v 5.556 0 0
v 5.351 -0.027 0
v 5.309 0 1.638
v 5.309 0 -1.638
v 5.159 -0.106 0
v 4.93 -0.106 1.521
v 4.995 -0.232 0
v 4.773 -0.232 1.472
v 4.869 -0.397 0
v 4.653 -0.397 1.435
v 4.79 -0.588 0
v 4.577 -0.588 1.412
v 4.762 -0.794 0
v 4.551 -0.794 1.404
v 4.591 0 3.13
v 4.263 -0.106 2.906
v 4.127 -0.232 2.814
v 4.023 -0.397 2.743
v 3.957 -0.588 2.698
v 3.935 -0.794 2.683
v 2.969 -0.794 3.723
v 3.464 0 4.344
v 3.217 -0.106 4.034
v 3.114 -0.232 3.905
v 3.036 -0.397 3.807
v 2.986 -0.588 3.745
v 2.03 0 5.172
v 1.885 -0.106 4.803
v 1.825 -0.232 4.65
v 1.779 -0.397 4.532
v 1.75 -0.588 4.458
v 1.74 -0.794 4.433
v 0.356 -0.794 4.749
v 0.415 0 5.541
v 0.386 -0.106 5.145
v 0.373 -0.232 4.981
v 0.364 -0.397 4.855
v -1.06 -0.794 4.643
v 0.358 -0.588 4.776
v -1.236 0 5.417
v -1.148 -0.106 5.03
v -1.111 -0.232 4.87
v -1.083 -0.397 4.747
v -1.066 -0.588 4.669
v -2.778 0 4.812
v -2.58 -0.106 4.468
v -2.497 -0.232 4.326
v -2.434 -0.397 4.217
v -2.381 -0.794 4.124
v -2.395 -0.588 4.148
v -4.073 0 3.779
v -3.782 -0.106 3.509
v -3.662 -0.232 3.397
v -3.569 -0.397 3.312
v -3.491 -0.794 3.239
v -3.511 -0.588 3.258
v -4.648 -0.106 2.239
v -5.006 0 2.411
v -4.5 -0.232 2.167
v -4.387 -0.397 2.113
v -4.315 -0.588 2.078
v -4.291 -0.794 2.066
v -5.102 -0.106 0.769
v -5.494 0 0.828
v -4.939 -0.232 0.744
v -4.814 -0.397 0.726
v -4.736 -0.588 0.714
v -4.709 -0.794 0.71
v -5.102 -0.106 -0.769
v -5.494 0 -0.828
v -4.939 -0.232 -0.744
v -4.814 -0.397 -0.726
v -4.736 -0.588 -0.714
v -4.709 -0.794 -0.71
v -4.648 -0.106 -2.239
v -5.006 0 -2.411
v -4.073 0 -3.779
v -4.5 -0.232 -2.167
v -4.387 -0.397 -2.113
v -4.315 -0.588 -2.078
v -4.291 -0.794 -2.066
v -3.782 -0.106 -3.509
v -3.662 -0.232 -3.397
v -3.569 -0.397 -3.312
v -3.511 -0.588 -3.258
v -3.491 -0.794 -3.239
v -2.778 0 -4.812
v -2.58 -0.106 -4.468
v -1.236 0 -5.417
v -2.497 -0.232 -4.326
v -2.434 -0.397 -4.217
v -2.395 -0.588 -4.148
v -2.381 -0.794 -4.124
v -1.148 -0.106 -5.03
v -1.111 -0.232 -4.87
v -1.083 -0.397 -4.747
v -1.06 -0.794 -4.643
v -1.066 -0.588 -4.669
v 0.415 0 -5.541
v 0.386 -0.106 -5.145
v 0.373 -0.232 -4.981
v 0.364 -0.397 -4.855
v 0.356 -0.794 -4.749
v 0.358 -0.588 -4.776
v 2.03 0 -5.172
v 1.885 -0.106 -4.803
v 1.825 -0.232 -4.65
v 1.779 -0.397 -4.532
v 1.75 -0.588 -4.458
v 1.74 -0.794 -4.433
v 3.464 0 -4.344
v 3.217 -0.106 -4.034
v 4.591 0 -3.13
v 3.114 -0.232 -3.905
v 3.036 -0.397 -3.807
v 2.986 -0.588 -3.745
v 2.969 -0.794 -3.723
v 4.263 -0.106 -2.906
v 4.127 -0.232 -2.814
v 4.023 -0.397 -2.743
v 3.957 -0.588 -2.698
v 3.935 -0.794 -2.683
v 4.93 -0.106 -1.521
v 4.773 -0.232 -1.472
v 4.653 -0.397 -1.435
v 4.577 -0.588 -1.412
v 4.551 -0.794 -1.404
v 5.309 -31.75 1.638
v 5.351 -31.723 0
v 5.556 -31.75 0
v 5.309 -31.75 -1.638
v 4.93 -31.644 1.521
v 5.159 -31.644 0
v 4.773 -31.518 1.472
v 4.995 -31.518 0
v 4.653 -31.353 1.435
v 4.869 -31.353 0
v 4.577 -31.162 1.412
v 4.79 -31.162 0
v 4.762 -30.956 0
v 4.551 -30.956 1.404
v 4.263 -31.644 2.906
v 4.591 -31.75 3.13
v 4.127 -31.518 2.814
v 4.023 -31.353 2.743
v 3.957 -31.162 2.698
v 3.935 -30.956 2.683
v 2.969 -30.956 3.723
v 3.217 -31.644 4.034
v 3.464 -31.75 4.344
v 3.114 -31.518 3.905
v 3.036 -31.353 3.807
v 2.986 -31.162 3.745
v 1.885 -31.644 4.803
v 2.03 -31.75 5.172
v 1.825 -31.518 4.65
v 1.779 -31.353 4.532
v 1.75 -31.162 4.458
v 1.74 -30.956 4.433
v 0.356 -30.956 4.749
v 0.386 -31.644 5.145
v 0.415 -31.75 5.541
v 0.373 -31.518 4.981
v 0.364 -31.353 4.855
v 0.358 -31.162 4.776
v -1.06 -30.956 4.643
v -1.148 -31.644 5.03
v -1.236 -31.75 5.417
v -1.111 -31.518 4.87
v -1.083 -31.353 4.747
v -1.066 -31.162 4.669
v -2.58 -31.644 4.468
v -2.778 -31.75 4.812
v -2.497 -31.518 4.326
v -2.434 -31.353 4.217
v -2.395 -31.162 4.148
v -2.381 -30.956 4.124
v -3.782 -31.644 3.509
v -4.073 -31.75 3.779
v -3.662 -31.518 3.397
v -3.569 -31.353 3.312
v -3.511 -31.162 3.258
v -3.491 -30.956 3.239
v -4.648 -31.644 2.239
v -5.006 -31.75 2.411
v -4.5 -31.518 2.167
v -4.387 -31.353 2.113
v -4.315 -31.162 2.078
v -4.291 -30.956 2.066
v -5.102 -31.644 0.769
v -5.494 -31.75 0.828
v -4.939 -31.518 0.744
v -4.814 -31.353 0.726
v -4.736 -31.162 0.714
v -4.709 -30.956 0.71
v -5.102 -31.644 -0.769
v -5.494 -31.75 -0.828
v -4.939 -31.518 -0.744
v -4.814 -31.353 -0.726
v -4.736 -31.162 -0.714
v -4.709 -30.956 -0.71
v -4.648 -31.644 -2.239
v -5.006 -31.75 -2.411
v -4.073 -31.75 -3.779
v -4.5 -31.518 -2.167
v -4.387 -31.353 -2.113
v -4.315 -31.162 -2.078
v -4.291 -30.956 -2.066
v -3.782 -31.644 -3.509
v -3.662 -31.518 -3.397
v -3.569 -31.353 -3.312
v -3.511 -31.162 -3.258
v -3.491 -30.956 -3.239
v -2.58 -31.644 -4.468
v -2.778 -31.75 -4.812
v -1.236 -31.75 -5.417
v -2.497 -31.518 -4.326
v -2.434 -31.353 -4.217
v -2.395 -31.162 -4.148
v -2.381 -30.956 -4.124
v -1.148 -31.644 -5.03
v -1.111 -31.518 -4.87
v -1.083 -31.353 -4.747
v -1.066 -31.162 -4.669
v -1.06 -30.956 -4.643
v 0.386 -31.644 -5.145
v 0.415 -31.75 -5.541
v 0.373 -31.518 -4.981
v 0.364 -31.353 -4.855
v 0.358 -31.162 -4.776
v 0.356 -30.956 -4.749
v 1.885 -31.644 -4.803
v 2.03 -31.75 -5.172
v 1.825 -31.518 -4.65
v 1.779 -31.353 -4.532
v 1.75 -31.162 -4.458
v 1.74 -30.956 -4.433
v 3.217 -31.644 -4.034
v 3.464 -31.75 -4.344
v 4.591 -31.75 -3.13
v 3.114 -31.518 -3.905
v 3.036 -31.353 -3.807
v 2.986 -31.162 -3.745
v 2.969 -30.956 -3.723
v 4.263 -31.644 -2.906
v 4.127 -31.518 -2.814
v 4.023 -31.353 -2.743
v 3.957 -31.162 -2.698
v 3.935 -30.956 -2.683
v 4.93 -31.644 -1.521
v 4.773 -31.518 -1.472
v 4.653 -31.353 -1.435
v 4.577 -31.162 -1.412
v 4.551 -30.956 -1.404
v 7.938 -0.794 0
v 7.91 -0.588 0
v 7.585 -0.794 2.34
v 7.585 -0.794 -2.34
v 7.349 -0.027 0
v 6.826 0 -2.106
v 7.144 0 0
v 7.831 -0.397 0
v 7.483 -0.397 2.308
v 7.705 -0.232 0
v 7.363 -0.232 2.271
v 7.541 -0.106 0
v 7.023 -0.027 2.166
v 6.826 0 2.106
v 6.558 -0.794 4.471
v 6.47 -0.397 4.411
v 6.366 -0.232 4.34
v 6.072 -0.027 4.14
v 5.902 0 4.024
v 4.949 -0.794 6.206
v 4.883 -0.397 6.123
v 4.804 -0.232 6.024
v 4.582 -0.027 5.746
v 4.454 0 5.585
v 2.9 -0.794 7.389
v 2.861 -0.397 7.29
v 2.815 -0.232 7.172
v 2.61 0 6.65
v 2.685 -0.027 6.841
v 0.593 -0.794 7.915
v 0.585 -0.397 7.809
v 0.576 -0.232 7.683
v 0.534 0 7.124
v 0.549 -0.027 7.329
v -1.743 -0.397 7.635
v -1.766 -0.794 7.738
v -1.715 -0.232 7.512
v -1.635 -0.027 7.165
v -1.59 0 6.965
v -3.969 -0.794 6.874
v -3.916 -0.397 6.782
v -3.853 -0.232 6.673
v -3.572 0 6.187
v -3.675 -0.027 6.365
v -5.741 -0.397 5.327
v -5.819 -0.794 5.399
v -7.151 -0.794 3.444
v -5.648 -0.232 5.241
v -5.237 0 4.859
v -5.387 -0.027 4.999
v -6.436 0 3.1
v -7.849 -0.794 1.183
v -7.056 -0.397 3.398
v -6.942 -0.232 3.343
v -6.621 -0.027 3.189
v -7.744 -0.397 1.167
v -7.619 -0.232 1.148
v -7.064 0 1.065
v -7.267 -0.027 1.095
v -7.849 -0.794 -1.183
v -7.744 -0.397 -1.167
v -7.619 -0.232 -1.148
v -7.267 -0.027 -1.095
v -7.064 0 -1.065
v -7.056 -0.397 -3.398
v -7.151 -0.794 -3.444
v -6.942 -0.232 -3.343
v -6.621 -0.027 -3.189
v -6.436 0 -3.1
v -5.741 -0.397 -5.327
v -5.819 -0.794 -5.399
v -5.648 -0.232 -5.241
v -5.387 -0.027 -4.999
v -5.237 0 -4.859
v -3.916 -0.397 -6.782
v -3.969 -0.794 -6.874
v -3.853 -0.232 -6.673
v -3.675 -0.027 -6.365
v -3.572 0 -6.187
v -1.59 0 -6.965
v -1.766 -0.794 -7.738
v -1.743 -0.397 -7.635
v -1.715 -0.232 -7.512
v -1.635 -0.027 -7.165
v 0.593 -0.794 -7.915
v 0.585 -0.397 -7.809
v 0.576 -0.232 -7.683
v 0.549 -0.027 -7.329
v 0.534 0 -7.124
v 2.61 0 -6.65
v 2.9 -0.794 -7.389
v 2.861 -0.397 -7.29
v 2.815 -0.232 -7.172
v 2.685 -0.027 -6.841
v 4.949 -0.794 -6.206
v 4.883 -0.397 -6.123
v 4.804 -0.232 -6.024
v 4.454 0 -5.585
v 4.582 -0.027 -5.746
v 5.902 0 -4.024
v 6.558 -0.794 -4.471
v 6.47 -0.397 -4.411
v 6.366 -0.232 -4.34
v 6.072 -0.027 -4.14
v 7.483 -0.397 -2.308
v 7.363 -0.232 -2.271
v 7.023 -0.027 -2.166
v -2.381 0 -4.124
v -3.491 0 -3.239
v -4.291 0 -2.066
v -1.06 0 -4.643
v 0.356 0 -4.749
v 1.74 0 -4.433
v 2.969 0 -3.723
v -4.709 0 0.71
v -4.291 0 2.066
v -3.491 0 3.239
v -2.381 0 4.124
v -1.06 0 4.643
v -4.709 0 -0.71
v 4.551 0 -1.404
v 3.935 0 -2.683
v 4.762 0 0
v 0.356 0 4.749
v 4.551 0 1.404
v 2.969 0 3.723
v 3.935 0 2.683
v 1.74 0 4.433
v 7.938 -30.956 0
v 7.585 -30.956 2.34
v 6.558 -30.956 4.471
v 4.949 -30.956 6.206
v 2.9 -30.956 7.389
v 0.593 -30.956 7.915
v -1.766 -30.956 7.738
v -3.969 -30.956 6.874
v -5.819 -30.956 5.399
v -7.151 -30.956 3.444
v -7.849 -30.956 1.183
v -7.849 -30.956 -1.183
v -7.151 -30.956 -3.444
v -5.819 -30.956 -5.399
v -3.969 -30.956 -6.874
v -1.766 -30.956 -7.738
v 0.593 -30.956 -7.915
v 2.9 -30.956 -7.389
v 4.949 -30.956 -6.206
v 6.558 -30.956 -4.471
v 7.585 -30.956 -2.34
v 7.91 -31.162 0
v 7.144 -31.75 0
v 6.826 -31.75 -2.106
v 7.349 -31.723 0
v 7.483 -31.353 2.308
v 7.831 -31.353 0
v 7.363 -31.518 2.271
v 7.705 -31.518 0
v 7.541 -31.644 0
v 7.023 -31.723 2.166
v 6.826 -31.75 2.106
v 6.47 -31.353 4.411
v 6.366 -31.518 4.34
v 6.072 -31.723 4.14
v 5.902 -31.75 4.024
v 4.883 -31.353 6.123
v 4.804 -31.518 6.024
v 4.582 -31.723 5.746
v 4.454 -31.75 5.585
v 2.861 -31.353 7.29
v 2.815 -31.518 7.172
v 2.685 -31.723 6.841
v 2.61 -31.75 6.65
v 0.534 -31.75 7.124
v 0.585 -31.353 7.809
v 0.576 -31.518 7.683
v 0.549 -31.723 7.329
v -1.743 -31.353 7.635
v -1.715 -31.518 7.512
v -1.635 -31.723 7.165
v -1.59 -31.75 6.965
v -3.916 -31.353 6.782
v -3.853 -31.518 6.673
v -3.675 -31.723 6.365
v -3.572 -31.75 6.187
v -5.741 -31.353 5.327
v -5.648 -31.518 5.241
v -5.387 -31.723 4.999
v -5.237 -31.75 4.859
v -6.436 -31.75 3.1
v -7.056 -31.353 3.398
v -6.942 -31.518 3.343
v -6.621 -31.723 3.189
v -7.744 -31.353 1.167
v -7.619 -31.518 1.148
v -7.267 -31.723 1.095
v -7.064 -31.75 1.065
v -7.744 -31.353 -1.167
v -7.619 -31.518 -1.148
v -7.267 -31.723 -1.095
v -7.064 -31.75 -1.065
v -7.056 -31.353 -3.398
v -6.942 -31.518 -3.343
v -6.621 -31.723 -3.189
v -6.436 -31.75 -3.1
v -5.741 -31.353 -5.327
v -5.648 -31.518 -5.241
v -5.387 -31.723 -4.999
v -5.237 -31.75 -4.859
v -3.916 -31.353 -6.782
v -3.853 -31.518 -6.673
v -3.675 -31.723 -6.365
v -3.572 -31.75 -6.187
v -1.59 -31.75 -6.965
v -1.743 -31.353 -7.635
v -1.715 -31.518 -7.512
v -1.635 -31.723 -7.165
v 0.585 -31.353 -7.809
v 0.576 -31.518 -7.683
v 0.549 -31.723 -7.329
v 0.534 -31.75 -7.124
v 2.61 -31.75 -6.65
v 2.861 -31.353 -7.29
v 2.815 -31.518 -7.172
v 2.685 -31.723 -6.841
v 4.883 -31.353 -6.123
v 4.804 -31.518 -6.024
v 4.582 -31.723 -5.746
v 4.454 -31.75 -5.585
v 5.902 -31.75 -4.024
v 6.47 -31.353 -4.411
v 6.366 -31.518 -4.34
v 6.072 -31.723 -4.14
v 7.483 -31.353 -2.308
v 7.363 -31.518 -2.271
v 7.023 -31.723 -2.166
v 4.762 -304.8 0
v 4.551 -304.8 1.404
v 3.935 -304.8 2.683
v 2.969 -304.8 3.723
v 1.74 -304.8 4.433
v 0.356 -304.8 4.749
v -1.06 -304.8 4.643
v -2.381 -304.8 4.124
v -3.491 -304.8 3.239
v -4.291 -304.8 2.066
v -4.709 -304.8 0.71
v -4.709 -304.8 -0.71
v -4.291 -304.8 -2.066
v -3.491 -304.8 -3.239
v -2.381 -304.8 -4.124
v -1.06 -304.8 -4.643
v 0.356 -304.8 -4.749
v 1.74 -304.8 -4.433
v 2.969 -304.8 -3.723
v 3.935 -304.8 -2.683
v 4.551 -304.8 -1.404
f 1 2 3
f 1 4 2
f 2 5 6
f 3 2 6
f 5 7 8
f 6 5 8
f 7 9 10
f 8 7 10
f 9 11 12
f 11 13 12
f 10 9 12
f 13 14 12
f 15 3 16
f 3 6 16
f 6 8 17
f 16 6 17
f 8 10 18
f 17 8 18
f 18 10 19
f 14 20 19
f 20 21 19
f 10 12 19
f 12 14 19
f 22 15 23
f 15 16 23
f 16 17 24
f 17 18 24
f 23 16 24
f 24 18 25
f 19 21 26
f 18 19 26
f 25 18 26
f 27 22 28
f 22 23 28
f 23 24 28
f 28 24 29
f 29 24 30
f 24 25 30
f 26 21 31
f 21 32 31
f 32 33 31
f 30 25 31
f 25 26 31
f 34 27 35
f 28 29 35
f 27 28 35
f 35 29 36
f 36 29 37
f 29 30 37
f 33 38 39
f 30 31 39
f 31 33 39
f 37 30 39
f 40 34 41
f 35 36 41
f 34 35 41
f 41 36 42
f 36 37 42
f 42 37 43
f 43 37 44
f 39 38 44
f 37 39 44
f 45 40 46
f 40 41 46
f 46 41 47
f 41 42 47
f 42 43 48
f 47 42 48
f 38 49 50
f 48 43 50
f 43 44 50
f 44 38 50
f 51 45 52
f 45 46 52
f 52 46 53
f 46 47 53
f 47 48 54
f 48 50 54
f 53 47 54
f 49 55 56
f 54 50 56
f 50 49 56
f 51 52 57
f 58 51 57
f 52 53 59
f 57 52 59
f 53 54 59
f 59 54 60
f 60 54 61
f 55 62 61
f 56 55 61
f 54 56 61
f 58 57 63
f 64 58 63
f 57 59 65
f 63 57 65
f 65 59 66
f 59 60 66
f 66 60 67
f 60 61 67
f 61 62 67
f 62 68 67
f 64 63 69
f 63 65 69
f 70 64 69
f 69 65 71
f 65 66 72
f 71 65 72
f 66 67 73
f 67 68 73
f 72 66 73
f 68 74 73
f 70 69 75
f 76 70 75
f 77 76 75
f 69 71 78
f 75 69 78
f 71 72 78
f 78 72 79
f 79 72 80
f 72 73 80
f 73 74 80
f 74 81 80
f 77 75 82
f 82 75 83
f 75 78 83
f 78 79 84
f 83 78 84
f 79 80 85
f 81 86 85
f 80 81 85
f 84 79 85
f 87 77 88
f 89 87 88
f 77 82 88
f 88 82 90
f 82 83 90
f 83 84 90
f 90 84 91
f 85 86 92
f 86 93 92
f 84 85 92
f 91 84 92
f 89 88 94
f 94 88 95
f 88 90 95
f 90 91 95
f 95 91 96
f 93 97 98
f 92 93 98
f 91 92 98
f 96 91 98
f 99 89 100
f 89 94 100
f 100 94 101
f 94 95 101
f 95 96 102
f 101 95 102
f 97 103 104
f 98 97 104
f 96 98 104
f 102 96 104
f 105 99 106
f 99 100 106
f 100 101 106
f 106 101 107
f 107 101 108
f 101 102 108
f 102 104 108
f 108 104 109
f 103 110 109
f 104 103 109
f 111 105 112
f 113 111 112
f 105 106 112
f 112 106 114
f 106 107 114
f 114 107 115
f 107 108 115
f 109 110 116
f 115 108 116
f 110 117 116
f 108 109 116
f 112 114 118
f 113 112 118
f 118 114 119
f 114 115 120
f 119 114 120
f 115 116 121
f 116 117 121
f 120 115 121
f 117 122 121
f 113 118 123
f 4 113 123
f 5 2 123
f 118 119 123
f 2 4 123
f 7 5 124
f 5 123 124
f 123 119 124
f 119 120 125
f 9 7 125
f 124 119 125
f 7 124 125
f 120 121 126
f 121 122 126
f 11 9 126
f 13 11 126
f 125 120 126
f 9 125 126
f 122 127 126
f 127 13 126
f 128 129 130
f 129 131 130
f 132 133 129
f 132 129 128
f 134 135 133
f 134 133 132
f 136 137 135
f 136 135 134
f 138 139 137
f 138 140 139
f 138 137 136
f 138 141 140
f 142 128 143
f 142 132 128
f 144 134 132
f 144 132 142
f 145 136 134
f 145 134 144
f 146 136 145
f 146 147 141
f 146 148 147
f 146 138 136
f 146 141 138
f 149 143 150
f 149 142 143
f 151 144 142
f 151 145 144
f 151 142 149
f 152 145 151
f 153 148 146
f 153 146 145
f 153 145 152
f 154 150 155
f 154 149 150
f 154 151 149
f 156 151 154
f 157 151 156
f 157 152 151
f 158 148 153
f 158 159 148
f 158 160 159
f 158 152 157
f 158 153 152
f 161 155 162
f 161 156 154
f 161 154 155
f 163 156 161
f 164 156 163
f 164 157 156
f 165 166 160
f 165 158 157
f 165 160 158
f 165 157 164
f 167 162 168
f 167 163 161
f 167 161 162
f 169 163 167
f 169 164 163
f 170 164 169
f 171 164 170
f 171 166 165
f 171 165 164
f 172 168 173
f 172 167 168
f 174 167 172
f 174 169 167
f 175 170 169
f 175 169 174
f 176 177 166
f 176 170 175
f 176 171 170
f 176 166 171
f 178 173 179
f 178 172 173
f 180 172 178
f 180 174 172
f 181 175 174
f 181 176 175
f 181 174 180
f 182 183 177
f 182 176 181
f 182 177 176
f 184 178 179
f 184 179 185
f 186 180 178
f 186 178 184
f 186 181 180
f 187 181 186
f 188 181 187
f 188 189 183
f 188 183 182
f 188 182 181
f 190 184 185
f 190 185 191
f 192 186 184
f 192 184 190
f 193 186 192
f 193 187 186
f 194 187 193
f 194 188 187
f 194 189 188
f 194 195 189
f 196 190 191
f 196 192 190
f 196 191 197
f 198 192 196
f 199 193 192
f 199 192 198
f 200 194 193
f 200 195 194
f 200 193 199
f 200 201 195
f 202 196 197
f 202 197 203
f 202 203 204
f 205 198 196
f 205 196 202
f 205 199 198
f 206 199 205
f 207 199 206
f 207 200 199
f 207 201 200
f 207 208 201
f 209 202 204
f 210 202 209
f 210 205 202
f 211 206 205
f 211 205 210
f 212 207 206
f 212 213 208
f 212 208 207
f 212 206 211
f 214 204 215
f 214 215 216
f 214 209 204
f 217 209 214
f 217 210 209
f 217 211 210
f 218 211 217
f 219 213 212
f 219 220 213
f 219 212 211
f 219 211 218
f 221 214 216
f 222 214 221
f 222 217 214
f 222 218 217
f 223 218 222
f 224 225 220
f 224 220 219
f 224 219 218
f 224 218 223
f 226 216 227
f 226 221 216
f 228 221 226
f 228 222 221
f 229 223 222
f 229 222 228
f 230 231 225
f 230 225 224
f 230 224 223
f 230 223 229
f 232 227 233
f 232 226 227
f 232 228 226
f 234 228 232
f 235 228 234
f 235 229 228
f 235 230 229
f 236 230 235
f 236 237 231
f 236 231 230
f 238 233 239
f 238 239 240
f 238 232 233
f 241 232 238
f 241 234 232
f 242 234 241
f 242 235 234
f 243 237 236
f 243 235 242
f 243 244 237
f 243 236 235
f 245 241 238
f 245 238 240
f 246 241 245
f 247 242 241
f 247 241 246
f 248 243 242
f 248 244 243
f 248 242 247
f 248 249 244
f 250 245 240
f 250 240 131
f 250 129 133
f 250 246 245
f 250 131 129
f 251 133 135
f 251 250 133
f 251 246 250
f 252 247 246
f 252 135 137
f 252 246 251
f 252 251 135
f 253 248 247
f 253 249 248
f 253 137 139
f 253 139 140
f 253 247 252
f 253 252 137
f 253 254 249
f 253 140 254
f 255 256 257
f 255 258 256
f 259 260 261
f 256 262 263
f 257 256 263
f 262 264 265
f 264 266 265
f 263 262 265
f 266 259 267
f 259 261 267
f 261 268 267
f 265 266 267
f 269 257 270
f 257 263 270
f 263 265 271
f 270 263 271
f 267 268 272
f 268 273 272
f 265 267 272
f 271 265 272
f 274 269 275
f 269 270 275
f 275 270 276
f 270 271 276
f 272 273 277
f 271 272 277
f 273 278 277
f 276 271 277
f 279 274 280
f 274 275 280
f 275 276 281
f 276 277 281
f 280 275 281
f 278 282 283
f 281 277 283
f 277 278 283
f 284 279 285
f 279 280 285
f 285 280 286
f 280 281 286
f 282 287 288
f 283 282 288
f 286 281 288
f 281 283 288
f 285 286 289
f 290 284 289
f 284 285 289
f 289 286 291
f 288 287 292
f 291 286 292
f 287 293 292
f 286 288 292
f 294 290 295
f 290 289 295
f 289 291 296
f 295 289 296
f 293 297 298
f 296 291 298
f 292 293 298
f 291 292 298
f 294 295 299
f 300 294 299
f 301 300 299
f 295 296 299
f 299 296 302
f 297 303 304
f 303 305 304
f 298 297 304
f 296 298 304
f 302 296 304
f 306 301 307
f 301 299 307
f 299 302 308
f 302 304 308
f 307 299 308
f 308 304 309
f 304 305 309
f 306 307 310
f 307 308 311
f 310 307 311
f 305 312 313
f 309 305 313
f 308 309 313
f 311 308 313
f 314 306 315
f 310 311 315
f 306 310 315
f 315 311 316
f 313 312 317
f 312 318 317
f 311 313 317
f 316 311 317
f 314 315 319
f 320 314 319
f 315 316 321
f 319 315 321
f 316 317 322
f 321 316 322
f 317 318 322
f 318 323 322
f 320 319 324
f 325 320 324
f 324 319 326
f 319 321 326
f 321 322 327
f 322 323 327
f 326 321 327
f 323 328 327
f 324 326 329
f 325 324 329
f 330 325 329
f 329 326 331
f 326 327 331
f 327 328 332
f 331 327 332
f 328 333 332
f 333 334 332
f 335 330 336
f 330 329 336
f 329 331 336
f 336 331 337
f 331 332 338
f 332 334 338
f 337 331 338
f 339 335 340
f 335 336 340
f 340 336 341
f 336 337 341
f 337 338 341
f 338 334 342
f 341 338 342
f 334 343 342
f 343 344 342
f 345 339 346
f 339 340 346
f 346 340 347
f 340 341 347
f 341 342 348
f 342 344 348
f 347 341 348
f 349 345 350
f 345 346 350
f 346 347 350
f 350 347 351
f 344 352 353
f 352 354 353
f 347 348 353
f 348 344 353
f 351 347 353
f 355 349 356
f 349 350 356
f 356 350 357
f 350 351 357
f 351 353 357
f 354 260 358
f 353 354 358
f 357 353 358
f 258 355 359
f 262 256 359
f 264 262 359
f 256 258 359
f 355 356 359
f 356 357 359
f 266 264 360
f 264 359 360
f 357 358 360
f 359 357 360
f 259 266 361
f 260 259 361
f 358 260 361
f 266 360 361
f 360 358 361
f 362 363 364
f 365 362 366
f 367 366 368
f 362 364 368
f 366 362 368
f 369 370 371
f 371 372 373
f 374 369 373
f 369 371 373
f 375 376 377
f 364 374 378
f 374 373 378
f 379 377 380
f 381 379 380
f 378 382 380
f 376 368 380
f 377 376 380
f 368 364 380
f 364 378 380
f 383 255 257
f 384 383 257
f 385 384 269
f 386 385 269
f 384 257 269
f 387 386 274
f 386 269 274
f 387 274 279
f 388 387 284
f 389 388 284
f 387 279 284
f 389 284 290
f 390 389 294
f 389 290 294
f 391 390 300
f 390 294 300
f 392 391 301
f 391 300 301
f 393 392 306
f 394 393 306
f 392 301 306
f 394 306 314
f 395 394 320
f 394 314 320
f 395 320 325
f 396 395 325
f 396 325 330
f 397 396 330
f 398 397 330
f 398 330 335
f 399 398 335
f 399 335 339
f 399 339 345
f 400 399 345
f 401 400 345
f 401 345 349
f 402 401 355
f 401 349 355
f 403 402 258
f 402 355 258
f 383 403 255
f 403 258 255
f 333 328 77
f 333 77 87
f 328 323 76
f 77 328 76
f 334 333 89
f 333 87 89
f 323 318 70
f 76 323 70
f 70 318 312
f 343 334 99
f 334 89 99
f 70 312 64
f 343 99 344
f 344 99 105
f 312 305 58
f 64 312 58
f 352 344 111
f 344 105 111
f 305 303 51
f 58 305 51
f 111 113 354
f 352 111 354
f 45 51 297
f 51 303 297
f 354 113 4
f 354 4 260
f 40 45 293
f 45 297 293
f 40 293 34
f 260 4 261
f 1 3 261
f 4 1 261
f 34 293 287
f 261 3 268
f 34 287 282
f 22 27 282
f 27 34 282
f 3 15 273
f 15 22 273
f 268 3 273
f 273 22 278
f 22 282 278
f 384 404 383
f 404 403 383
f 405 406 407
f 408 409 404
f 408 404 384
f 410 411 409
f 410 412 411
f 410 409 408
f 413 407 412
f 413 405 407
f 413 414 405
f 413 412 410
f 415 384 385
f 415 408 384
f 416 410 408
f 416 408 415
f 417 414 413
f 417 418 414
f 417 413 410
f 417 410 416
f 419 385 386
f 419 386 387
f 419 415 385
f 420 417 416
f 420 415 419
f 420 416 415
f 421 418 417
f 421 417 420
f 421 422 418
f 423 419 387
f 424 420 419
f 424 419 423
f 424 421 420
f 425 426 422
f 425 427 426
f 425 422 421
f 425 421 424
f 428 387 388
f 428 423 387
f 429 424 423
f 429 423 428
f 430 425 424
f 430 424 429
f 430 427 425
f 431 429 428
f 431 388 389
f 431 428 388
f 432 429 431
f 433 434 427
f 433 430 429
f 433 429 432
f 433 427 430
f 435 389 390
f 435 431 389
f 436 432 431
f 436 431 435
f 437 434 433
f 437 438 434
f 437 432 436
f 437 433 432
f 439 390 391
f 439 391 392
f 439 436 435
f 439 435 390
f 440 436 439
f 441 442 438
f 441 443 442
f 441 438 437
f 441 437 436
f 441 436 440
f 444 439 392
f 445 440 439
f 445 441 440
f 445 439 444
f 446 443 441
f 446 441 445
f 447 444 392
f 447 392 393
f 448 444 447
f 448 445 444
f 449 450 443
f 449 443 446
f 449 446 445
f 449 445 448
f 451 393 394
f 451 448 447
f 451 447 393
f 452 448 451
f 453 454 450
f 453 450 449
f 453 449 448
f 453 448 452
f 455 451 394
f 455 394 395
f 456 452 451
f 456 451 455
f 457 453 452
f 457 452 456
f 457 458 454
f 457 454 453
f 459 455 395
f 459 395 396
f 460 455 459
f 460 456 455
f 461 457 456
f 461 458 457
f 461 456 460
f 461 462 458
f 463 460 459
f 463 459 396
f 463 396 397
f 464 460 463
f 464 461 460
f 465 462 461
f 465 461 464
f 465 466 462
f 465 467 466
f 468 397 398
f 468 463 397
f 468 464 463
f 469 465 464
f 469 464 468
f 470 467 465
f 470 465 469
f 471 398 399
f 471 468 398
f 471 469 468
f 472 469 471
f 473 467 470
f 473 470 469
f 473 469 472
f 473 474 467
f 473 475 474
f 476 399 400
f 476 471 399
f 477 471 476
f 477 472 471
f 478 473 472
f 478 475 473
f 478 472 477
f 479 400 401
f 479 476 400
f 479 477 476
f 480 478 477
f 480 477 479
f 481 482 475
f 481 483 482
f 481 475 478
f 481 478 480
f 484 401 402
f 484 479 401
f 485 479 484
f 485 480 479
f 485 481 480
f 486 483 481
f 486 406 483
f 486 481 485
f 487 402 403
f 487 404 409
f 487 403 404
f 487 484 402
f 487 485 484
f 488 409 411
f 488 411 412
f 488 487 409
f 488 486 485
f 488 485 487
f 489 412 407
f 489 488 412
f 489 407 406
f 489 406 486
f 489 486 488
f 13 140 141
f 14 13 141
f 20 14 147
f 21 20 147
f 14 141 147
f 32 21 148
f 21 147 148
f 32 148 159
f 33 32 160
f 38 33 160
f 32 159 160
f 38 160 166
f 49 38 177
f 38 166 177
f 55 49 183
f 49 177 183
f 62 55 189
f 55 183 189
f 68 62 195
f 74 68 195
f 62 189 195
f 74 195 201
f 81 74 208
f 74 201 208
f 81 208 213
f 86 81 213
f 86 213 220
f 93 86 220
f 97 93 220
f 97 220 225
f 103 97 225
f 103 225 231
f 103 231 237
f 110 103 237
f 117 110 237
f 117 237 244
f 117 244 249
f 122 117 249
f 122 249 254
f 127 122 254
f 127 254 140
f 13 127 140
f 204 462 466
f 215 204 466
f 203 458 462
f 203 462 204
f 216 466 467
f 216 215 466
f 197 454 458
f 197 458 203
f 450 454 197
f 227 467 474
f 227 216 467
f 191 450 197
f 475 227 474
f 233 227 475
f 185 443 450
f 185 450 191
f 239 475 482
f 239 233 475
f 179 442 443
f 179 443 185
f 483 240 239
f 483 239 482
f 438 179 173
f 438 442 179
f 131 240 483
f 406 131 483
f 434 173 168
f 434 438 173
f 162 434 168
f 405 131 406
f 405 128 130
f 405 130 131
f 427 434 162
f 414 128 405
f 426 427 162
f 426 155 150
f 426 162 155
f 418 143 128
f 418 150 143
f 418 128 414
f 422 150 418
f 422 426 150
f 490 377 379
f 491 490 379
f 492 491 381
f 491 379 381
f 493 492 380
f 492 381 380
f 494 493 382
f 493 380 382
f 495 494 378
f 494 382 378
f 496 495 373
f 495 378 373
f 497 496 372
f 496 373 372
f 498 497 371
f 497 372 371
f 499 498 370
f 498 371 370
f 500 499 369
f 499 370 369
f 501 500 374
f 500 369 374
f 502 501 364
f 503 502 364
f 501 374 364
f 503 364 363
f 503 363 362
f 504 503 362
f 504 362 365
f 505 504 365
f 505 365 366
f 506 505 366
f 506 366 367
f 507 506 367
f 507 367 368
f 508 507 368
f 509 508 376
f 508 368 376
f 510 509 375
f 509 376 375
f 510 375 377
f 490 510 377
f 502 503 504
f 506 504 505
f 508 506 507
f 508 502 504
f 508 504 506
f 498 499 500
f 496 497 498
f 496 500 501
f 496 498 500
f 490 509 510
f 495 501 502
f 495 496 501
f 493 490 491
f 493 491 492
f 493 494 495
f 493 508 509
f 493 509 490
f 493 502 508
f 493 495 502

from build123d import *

# Parameters (mm, degrees)
F0_R     = 7.9375
F1_DEPTH = 31.75
F2_R     = 4.7625
F3_DEPTH = 31.751
F4_R     = 0.79375
F5_R     = 4.7625
F6_DEPTH = 304.8


with BuildPart() as f1:
    # F0 (on Front) → F1 (new body)
    with BuildSketch(Plane.XZ):
        Circle(F0_R)
    extrude(amount=F1_DEPTH)

    # F2 (on face) → F3 (cut, through all)
    with BuildSketch(Plane.XZ.offset(31.75)):
        Circle(F2_R)
    extrude(amount=-F3_DEPTH, mode=Mode.SUBTRACT)

    # F4
    f4_edges = [f1.edges().sort_by_distance(p)[0] for p in [
        (-7.9375, -31.75, 0),
        (-4.7625, -31.75, 0),
        (-7.9375, 0, 0),
        (-4.7625, 0, 0),
    ]]
    fillet(f4_edges, radius=F4_R)


with BuildPart() as f6:
    # F5 (on Front) → F6 (new body)
    with BuildSketch(Plane.XZ):
        Circle(F5_R)
    extrude(amount=F6_DEPTH)


solid = Compound([f1.part, f6.part])
